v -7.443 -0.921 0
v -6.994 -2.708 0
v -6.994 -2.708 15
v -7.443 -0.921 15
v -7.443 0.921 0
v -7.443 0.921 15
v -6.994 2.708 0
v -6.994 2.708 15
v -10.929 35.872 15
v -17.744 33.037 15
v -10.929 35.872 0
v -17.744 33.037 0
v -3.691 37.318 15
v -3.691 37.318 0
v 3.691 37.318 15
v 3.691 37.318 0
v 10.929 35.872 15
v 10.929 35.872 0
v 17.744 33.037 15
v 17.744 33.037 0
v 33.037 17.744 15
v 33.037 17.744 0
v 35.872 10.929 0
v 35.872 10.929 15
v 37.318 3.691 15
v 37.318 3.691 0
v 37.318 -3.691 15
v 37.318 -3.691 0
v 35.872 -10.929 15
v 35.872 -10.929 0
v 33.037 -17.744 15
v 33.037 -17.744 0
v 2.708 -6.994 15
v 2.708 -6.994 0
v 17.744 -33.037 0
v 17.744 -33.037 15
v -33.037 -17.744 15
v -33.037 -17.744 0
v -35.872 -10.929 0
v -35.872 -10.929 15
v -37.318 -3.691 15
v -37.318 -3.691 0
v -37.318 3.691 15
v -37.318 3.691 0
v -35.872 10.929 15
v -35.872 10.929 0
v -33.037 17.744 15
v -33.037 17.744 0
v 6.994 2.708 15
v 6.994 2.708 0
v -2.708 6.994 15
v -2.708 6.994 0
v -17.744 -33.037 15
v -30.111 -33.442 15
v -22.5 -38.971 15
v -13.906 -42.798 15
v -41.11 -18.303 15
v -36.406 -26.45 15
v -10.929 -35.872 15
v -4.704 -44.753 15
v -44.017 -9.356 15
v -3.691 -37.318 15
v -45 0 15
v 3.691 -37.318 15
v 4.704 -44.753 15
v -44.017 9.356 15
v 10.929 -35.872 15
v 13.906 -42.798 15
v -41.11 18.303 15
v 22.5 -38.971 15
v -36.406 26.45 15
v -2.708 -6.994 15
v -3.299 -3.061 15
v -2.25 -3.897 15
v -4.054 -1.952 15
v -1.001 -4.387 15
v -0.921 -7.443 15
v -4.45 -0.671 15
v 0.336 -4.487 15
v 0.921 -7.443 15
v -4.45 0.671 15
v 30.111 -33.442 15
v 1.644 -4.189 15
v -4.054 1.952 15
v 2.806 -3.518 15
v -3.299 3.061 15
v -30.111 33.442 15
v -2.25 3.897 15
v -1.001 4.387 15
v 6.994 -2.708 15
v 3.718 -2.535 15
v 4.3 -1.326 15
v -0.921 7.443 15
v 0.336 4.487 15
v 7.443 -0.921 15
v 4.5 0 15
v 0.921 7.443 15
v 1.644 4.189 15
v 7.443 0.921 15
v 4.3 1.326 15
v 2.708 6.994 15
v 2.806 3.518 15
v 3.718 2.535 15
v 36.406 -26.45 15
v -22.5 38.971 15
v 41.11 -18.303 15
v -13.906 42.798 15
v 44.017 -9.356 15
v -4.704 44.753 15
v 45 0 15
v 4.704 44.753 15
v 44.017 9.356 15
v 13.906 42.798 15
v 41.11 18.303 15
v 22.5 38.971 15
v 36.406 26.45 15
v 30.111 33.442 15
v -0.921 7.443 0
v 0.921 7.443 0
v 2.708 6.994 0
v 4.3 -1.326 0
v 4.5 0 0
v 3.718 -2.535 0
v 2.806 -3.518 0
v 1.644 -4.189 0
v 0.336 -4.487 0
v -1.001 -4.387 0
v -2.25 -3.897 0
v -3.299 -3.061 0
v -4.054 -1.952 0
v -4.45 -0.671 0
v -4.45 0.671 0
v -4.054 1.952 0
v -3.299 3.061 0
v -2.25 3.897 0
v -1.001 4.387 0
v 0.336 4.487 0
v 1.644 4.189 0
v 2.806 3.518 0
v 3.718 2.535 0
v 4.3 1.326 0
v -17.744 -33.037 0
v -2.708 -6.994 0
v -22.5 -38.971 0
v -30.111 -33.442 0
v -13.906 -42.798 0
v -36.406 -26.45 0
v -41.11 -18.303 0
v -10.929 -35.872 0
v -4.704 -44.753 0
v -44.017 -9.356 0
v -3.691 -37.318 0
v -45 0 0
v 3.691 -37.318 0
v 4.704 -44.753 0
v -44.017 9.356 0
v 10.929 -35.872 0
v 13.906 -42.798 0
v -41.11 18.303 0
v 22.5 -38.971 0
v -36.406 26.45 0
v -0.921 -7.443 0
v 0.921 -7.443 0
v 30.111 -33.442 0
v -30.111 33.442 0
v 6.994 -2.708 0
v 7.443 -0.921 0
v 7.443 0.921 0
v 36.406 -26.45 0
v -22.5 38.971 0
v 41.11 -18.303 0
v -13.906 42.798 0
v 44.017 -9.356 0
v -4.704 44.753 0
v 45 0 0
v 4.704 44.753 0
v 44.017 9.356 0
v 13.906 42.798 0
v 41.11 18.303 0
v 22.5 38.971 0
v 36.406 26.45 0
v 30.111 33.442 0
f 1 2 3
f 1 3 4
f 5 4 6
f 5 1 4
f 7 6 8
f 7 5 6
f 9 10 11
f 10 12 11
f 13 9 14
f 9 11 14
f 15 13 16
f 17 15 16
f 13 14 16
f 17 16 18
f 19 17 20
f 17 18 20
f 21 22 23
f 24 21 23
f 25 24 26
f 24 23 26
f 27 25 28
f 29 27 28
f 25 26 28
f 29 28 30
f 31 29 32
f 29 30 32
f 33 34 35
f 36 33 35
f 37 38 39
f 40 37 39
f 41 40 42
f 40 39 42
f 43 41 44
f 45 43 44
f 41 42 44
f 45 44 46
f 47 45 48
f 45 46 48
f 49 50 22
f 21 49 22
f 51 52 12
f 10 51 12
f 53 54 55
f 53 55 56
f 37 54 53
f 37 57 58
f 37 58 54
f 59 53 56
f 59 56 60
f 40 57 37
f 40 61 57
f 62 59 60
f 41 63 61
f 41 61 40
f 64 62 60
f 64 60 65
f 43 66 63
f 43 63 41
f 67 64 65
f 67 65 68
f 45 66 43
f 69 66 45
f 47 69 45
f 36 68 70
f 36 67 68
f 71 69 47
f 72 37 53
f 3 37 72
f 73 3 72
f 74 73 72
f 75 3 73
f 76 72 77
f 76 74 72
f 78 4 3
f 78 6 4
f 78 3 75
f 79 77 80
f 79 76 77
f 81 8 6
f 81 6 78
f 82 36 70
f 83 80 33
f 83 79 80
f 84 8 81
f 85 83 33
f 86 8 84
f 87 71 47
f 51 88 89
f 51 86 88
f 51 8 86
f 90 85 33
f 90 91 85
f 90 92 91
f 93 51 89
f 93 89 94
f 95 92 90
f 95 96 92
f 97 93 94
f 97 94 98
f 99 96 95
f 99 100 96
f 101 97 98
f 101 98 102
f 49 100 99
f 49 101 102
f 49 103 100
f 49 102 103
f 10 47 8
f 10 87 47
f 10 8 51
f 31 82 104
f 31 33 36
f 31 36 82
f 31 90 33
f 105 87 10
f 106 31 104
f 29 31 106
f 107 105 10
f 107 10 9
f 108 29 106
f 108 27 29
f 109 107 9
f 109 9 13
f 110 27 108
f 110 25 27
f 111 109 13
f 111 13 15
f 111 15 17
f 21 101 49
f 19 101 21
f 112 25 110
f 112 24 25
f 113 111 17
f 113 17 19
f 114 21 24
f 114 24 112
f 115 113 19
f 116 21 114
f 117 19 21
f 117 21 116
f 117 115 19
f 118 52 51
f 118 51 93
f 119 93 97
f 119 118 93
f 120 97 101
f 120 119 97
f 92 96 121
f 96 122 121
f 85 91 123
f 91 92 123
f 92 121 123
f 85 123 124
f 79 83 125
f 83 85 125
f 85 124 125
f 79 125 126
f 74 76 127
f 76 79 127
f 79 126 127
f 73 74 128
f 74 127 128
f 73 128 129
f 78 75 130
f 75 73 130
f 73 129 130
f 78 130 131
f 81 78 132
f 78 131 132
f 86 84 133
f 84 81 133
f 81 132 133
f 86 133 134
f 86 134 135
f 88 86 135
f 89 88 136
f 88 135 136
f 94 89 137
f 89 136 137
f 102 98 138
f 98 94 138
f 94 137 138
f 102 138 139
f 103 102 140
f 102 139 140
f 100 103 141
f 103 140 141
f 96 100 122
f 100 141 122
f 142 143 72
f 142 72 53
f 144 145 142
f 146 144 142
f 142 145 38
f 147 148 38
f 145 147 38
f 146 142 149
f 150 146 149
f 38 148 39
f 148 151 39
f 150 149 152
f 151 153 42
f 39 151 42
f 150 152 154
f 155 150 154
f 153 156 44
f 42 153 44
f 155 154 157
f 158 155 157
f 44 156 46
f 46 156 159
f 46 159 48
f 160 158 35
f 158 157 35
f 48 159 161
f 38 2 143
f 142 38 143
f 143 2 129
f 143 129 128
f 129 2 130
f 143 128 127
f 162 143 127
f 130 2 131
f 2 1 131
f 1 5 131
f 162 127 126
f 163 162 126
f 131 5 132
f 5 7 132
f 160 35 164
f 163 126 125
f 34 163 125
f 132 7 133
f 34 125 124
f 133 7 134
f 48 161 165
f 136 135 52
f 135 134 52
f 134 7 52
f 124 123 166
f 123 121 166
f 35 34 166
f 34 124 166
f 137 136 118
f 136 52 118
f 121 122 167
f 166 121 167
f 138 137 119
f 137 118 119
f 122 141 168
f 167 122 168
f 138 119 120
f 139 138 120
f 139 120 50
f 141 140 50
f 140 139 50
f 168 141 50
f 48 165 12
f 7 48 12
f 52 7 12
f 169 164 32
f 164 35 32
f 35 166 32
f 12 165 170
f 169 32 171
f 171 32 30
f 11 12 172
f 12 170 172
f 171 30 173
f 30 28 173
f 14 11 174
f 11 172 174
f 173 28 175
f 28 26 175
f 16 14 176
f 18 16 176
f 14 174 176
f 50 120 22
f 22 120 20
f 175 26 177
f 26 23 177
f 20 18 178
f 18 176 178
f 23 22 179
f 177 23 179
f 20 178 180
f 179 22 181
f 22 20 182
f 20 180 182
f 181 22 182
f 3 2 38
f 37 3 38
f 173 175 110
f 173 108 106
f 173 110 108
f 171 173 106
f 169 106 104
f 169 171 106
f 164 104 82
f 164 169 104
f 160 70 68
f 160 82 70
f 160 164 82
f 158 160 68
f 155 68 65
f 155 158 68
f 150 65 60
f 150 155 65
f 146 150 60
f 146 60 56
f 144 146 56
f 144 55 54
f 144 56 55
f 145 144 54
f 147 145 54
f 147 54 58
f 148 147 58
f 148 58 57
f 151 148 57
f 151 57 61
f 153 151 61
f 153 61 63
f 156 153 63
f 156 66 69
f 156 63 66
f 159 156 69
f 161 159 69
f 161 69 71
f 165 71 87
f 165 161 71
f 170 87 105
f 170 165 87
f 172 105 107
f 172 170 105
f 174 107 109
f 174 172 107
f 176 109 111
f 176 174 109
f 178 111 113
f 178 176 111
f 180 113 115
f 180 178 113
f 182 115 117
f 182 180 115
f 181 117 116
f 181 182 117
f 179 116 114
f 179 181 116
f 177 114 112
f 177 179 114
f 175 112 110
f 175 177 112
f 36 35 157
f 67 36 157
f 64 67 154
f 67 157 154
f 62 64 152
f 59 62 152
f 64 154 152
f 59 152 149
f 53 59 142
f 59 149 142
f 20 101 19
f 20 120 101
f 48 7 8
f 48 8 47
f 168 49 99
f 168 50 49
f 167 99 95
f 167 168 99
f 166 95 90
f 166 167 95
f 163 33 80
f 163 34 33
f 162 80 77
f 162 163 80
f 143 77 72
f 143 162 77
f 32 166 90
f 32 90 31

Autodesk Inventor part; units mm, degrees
ref_plane "YZ Plane" through (0, 0, 0) normal (1, 0, 0) x (0, 1, 0)
ref_plane "XZ Plane" through (0, 0, 0) normal (0, 1, 0) x (-1, 0, 0)
ref_plane "XY Plane" through (0, 0, 0) normal (0, 0, 1) x (1, 0, 0)
sketch "Boceto1" plane through (0, 0, 0) normal (0, 0, 1) x (1, 0, 0)
  circle A0 centre (0, 0) radius 4.5
  circle A1 centre (0, 0) radius 45
  dimension "d0" = 9
  dimension "d1" = 90
extrude "Extrusión1" add sketch "Boceto1" along normal blind 15
sketch "Boceto2" plane through (0, 0, 0) normal (0, 0, -1) x (-1, 0, 0)
  arc A0 (-6.9941, 2.7079) -> (-6.9941, -2.7079) centre (0, 0) ccw
  arc A1 (-33.0366, 17.7436) -> (-33.0366, -17.7436) centre (0, 0) ccw
  line L0 (-6.9941, 2.7079) -> (-33.0366, 17.7436)
  line L1 (-6.9941, -2.7079) -> (-33.0366, -17.7436)
  line L2 (-2.7079, -6.9941) -> (-17.7436, -33.0366)
  arc A2 (-17.7436, -33.0366) -> (17.7436, -33.0366) centre (0, 0) ccw
  line L3 (2.7079, -6.9941) -> (17.7436, -33.0366)
  arc A3 (-2.7079, -6.9941) -> (2.7079, -6.9941) centre (0, 0) ccw
  line L4 (6.9941, -2.7079) -> (33.0366, -17.7436)
  arc A4 (33.0366, -17.7436) -> (33.0366, 17.7436) centre (0, 0) ccw
  line L5 (6.9941, 2.7079) -> (33.0366, 17.7436)
  arc A5 (6.9941, -2.7079) -> (6.9941, 2.7079) centre (0, 0) ccw
  line L6 (2.7079, 6.9941) -> (17.7436, 33.0366)
  arc A6 (17.7436, 33.0366) -> (-17.7436, 33.0366) centre (0, 0) ccw
  line L7 (-2.7079, 6.9941) -> (-17.7436, 33.0366)
  arc A7 (2.7079, 6.9941) -> (-2.7079, 6.9941) centre (0, 0) ccw
  dimension "d4" = 15
  dimension "d5" = 75
  dimension "d13" = 360
extrude "Extrusión2" cut sketch "Boceto2" against normal through all
